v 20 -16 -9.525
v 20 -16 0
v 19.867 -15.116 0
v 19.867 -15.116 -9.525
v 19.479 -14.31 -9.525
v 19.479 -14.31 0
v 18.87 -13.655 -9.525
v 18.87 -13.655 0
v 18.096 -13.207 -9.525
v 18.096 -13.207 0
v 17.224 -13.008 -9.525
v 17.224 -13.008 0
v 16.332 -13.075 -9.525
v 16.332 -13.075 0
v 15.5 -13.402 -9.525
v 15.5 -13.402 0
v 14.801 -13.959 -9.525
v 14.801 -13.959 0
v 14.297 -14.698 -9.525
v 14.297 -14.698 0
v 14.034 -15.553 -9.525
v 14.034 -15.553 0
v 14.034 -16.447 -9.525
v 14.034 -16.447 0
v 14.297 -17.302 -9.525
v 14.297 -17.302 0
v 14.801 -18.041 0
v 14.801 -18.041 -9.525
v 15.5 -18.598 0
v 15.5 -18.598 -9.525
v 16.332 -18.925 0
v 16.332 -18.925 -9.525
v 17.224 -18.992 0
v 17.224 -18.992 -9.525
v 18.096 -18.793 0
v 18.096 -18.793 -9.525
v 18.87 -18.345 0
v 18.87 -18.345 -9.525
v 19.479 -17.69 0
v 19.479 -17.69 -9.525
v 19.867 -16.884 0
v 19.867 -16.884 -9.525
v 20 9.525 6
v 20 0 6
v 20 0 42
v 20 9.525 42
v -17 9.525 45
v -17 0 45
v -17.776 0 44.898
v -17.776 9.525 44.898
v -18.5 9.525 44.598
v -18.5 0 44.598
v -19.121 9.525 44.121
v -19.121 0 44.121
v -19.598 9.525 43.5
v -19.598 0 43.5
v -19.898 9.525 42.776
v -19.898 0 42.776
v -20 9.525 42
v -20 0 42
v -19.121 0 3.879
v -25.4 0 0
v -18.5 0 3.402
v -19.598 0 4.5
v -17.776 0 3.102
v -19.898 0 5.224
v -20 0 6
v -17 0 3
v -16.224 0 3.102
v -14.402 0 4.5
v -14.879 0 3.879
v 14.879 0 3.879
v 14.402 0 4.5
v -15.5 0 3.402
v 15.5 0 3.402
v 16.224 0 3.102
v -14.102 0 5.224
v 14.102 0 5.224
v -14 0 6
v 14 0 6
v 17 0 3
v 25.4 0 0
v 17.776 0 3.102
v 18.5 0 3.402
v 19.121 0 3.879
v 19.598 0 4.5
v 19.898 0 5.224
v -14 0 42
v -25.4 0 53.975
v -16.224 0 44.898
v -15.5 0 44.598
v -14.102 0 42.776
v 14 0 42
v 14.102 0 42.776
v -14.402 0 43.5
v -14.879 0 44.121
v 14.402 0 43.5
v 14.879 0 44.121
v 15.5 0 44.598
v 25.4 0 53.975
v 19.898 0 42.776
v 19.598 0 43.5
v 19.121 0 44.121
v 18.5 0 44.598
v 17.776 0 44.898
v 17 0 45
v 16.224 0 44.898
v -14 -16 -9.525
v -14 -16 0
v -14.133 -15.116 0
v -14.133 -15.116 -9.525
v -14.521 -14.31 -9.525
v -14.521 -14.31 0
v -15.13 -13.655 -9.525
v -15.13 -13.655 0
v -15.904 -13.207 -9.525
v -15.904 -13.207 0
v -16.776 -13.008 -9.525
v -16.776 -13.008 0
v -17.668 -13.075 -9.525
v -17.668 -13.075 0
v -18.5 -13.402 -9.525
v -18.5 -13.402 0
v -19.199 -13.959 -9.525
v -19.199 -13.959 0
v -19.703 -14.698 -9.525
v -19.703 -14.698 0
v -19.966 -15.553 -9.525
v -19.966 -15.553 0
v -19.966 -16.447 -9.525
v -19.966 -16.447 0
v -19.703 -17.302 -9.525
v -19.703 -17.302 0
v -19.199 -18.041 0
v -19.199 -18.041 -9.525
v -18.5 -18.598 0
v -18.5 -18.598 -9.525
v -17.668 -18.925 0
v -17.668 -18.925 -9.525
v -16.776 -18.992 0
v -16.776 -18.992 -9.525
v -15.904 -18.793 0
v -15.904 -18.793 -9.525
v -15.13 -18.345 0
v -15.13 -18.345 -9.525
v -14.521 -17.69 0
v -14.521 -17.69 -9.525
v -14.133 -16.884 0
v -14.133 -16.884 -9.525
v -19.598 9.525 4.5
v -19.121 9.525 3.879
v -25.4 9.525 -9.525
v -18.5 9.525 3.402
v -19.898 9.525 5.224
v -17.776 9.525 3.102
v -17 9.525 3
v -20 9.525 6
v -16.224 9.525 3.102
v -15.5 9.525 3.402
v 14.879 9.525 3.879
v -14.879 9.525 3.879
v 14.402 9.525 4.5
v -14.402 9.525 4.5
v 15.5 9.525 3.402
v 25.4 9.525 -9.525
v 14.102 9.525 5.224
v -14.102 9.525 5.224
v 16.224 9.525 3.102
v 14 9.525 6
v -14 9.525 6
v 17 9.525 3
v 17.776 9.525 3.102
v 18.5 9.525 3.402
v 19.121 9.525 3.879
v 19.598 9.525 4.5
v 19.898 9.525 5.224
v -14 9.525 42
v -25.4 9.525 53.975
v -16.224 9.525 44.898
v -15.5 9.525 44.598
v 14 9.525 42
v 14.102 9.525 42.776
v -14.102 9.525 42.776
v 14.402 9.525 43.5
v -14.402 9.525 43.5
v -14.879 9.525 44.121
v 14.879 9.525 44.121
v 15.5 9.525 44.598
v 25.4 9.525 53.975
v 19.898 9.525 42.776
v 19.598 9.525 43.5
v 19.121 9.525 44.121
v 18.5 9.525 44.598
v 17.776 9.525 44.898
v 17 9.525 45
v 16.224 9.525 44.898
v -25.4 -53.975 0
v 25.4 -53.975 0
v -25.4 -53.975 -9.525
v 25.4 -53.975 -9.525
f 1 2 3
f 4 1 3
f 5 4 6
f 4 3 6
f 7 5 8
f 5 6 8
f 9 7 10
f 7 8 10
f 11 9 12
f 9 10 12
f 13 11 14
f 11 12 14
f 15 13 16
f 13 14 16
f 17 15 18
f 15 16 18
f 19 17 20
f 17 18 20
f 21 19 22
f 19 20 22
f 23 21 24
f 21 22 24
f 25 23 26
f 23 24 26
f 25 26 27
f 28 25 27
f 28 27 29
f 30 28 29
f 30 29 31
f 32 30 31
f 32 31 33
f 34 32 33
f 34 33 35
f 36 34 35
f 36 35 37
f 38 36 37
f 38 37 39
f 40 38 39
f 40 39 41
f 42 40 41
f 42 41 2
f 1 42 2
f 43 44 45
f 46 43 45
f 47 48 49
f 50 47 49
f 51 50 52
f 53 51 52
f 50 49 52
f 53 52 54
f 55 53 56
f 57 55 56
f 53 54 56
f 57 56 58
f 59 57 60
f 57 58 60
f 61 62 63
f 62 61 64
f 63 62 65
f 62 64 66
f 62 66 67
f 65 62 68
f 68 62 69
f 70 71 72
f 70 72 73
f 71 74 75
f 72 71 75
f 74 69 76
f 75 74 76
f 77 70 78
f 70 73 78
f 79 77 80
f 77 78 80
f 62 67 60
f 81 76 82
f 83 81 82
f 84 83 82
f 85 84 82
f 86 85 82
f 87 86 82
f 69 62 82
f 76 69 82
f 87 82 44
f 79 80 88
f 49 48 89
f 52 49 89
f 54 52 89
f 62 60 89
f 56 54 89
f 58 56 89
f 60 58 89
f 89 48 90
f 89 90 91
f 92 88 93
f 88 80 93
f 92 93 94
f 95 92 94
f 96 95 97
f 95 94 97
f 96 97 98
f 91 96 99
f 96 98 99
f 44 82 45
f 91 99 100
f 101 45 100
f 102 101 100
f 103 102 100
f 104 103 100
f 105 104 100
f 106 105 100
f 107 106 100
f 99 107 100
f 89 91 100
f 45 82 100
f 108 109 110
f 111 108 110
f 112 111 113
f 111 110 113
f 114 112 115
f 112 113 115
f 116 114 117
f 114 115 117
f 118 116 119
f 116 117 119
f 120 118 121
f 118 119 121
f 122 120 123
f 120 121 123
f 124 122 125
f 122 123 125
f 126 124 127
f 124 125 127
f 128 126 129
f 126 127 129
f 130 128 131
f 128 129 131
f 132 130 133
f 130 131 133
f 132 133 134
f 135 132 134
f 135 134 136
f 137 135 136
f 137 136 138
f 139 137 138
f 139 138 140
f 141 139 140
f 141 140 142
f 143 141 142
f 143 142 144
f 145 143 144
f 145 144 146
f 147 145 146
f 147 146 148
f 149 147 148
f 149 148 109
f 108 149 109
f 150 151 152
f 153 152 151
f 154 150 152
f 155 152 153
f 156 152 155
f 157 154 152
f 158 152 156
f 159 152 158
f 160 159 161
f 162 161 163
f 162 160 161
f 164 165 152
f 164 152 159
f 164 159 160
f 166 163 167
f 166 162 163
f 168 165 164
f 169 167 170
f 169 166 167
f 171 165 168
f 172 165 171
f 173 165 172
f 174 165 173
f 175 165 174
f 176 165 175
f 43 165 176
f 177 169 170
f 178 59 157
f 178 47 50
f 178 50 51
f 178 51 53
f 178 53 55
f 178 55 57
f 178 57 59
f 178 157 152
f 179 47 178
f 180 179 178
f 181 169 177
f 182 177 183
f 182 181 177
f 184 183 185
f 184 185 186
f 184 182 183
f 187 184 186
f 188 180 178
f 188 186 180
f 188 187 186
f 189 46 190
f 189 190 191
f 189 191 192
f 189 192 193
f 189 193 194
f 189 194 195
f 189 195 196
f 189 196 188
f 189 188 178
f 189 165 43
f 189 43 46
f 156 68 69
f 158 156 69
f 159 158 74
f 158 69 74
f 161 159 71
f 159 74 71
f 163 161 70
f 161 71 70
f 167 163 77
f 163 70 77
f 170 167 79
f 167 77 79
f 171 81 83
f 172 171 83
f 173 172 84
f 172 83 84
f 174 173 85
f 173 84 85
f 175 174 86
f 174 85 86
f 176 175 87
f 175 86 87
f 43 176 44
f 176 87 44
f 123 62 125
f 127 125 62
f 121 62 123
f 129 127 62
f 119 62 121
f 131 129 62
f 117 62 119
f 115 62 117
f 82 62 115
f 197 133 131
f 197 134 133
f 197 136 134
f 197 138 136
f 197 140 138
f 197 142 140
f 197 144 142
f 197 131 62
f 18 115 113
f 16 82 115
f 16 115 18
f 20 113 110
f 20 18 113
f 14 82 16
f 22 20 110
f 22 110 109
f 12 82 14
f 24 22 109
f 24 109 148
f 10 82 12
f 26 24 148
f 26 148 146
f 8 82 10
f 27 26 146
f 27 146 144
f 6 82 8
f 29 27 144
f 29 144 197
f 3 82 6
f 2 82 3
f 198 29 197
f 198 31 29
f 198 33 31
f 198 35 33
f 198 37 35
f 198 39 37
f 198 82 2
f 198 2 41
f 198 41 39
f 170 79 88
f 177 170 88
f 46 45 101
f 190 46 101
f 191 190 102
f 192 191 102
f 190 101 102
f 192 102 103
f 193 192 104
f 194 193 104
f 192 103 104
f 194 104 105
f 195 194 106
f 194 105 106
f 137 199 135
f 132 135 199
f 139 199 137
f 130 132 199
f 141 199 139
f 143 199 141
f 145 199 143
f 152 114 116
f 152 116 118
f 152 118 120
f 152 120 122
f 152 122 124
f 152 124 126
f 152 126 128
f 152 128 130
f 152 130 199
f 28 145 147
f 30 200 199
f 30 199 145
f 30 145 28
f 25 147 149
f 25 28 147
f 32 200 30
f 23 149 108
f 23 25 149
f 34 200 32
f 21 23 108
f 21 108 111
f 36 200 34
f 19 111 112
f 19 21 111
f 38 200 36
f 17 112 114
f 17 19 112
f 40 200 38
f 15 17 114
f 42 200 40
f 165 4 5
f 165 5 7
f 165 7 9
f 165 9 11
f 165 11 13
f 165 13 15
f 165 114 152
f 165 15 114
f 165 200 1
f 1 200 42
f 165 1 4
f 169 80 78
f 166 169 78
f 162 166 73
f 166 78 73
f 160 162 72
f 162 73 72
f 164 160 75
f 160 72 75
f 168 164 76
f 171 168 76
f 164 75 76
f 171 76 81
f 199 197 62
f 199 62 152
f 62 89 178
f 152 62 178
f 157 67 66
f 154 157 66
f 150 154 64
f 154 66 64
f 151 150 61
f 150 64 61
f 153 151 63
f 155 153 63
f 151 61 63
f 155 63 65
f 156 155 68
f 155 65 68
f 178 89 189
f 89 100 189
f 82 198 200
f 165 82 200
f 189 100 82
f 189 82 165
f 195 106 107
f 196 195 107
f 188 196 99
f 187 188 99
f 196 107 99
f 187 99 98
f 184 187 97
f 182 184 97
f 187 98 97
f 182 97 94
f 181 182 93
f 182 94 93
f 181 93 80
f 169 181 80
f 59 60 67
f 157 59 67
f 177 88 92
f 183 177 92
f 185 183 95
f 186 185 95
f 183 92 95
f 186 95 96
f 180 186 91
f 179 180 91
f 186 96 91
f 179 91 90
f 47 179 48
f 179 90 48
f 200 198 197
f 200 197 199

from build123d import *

# Parameters (mm, degrees)
F0_W     = 9.525
F0_H     = 53.975
F3_DEPTH = 25.4
F4_DEPTH = 9.526
F2_R     = 3
F5_DEPTH = 9.526


with BuildPart() as f3:
    # F0 (on Right) → F3 (new body, symmetric)
    with BuildSketch(Plane.YZ):
        Polygon((9.525, 0), (0, 0), (-53.975, 0), (-53.975, -9.525), (9.525, -9.525), align=None)
        with Locations((4.7625, 26.9875)):
            Rectangle(F0_W, F0_H)
    extrude(amount=F3_DEPTH, both=True)

    # F1 (on Front) → F4 (cut, through all)
    with BuildSketch(Plane.XZ):
        with BuildLine():
            ThreePointArc((-14, 6), (-14.87868, 8.12132), (-17, 9))
            Line((-17, 9), (-17, 3))
            ThreePointArc((-17, 3), (-14.87868, 3.87868), (-14, 6))
        make_face()
        with BuildLine():
            Line((-17, 3), (-17, 9))
            ThreePointArc((-17, 9), (-19.12132, 8.12132), (-20, 6))
            ThreePointArc((-20, 6), (-19.12132, 3.87868), (-17, 3))
        make_face()
        with BuildLine():
            Line((-17, 9), (-17, 39))
            ThreePointArc((-17, 39), (-19.12132, 39.87868), (-20, 42))
            Line((-20, 42), (-20, 6))
            ThreePointArc((-20, 6), (-19.12132, 8.12132), (-17, 9))
        make_face()
        with BuildLine():
            ThreePointArc((-14, 42), (-14.87868, 39.87868), (-17, 39))
            Line((-17, 39), (-17, 9))
            ThreePointArc((-17, 9), (-14.87868, 8.12132), (-14, 6))
            Line((-14, 6), (-14, 42))
        make_face()
        with BuildLine():
            ThreePointArc((-14, 42), (-14.87868, 44.12132), (-17, 45))
            Line((-17, 45), (-17, 39))
            ThreePointArc((-17, 39), (-14.87868, 39.87868), (-14, 42))
        make_face()
        with BuildLine():
            Line((-17, 39), (-17, 45))
            ThreePointArc((-17, 45), (-19.12132, 44.12132), (-20, 42))
            ThreePointArc((-20, 42), (-19.12132, 39.87868), (-17, 39))
        make_face()
        with BuildLine():
            ThreePointArc((20, 42), (19.12132, 44.12132), (17, 45))
            Line((17, 45), (17, 39))
            ThreePointArc((17, 39), (19.12132, 39.87868), (20, 42))
        make_face()
        with BuildLine():
            Line((17, 39), (17, 45))
            ThreePointArc((17, 45), (14.87868, 44.12132), (14, 42))
            ThreePointArc((14, 42), (14.87868, 39.87868), (17, 39))
        make_face()
        with BuildLine():
            Line((17, 9), (17, 39))
            ThreePointArc((17, 39), (14.87868, 39.87868), (14, 42))
            Line((14, 42), (14, 6))
            ThreePointArc((14, 6), (14.87868, 8.12132), (17, 9))
        make_face()
        with BuildLine():
            ThreePointArc((20, 42), (19.12132, 39.87868), (17, 39))
            Line((17, 39), (17, 9))
            ThreePointArc((17, 9), (19.12132, 8.12132), (20, 6))
            Line((20, 6), (20, 42))
        make_face()
        with BuildLine():
            ThreePointArc((20, 6), (19.12132, 8.12132), (17, 9))
            Line((17, 9), (17, 3))
            ThreePointArc((17, 3), (19.12132, 3.87868), (20, 6))
        make_face()
        with BuildLine():
            Line((17, 3), (17, 9))
            ThreePointArc((17, 9), (14.87868, 8.12132), (14, 6))
            ThreePointArc((14, 6), (14.87868, 3.87868), (17, 3))
        make_face()
    extrude(amount=-F4_DEPTH, mode=Mode.SUBTRACT)

    # F2 (on Top) → F5 (cut, through all)
    with BuildSketch(Plane.XY):
        with Locations((-17, -16)):
            Circle(F2_R)
        with Locations((17, -16)):
            Circle(F2_R)
    extrude(amount=-F5_DEPTH, mode=Mode.SUBTRACT)


solid = f3.part
